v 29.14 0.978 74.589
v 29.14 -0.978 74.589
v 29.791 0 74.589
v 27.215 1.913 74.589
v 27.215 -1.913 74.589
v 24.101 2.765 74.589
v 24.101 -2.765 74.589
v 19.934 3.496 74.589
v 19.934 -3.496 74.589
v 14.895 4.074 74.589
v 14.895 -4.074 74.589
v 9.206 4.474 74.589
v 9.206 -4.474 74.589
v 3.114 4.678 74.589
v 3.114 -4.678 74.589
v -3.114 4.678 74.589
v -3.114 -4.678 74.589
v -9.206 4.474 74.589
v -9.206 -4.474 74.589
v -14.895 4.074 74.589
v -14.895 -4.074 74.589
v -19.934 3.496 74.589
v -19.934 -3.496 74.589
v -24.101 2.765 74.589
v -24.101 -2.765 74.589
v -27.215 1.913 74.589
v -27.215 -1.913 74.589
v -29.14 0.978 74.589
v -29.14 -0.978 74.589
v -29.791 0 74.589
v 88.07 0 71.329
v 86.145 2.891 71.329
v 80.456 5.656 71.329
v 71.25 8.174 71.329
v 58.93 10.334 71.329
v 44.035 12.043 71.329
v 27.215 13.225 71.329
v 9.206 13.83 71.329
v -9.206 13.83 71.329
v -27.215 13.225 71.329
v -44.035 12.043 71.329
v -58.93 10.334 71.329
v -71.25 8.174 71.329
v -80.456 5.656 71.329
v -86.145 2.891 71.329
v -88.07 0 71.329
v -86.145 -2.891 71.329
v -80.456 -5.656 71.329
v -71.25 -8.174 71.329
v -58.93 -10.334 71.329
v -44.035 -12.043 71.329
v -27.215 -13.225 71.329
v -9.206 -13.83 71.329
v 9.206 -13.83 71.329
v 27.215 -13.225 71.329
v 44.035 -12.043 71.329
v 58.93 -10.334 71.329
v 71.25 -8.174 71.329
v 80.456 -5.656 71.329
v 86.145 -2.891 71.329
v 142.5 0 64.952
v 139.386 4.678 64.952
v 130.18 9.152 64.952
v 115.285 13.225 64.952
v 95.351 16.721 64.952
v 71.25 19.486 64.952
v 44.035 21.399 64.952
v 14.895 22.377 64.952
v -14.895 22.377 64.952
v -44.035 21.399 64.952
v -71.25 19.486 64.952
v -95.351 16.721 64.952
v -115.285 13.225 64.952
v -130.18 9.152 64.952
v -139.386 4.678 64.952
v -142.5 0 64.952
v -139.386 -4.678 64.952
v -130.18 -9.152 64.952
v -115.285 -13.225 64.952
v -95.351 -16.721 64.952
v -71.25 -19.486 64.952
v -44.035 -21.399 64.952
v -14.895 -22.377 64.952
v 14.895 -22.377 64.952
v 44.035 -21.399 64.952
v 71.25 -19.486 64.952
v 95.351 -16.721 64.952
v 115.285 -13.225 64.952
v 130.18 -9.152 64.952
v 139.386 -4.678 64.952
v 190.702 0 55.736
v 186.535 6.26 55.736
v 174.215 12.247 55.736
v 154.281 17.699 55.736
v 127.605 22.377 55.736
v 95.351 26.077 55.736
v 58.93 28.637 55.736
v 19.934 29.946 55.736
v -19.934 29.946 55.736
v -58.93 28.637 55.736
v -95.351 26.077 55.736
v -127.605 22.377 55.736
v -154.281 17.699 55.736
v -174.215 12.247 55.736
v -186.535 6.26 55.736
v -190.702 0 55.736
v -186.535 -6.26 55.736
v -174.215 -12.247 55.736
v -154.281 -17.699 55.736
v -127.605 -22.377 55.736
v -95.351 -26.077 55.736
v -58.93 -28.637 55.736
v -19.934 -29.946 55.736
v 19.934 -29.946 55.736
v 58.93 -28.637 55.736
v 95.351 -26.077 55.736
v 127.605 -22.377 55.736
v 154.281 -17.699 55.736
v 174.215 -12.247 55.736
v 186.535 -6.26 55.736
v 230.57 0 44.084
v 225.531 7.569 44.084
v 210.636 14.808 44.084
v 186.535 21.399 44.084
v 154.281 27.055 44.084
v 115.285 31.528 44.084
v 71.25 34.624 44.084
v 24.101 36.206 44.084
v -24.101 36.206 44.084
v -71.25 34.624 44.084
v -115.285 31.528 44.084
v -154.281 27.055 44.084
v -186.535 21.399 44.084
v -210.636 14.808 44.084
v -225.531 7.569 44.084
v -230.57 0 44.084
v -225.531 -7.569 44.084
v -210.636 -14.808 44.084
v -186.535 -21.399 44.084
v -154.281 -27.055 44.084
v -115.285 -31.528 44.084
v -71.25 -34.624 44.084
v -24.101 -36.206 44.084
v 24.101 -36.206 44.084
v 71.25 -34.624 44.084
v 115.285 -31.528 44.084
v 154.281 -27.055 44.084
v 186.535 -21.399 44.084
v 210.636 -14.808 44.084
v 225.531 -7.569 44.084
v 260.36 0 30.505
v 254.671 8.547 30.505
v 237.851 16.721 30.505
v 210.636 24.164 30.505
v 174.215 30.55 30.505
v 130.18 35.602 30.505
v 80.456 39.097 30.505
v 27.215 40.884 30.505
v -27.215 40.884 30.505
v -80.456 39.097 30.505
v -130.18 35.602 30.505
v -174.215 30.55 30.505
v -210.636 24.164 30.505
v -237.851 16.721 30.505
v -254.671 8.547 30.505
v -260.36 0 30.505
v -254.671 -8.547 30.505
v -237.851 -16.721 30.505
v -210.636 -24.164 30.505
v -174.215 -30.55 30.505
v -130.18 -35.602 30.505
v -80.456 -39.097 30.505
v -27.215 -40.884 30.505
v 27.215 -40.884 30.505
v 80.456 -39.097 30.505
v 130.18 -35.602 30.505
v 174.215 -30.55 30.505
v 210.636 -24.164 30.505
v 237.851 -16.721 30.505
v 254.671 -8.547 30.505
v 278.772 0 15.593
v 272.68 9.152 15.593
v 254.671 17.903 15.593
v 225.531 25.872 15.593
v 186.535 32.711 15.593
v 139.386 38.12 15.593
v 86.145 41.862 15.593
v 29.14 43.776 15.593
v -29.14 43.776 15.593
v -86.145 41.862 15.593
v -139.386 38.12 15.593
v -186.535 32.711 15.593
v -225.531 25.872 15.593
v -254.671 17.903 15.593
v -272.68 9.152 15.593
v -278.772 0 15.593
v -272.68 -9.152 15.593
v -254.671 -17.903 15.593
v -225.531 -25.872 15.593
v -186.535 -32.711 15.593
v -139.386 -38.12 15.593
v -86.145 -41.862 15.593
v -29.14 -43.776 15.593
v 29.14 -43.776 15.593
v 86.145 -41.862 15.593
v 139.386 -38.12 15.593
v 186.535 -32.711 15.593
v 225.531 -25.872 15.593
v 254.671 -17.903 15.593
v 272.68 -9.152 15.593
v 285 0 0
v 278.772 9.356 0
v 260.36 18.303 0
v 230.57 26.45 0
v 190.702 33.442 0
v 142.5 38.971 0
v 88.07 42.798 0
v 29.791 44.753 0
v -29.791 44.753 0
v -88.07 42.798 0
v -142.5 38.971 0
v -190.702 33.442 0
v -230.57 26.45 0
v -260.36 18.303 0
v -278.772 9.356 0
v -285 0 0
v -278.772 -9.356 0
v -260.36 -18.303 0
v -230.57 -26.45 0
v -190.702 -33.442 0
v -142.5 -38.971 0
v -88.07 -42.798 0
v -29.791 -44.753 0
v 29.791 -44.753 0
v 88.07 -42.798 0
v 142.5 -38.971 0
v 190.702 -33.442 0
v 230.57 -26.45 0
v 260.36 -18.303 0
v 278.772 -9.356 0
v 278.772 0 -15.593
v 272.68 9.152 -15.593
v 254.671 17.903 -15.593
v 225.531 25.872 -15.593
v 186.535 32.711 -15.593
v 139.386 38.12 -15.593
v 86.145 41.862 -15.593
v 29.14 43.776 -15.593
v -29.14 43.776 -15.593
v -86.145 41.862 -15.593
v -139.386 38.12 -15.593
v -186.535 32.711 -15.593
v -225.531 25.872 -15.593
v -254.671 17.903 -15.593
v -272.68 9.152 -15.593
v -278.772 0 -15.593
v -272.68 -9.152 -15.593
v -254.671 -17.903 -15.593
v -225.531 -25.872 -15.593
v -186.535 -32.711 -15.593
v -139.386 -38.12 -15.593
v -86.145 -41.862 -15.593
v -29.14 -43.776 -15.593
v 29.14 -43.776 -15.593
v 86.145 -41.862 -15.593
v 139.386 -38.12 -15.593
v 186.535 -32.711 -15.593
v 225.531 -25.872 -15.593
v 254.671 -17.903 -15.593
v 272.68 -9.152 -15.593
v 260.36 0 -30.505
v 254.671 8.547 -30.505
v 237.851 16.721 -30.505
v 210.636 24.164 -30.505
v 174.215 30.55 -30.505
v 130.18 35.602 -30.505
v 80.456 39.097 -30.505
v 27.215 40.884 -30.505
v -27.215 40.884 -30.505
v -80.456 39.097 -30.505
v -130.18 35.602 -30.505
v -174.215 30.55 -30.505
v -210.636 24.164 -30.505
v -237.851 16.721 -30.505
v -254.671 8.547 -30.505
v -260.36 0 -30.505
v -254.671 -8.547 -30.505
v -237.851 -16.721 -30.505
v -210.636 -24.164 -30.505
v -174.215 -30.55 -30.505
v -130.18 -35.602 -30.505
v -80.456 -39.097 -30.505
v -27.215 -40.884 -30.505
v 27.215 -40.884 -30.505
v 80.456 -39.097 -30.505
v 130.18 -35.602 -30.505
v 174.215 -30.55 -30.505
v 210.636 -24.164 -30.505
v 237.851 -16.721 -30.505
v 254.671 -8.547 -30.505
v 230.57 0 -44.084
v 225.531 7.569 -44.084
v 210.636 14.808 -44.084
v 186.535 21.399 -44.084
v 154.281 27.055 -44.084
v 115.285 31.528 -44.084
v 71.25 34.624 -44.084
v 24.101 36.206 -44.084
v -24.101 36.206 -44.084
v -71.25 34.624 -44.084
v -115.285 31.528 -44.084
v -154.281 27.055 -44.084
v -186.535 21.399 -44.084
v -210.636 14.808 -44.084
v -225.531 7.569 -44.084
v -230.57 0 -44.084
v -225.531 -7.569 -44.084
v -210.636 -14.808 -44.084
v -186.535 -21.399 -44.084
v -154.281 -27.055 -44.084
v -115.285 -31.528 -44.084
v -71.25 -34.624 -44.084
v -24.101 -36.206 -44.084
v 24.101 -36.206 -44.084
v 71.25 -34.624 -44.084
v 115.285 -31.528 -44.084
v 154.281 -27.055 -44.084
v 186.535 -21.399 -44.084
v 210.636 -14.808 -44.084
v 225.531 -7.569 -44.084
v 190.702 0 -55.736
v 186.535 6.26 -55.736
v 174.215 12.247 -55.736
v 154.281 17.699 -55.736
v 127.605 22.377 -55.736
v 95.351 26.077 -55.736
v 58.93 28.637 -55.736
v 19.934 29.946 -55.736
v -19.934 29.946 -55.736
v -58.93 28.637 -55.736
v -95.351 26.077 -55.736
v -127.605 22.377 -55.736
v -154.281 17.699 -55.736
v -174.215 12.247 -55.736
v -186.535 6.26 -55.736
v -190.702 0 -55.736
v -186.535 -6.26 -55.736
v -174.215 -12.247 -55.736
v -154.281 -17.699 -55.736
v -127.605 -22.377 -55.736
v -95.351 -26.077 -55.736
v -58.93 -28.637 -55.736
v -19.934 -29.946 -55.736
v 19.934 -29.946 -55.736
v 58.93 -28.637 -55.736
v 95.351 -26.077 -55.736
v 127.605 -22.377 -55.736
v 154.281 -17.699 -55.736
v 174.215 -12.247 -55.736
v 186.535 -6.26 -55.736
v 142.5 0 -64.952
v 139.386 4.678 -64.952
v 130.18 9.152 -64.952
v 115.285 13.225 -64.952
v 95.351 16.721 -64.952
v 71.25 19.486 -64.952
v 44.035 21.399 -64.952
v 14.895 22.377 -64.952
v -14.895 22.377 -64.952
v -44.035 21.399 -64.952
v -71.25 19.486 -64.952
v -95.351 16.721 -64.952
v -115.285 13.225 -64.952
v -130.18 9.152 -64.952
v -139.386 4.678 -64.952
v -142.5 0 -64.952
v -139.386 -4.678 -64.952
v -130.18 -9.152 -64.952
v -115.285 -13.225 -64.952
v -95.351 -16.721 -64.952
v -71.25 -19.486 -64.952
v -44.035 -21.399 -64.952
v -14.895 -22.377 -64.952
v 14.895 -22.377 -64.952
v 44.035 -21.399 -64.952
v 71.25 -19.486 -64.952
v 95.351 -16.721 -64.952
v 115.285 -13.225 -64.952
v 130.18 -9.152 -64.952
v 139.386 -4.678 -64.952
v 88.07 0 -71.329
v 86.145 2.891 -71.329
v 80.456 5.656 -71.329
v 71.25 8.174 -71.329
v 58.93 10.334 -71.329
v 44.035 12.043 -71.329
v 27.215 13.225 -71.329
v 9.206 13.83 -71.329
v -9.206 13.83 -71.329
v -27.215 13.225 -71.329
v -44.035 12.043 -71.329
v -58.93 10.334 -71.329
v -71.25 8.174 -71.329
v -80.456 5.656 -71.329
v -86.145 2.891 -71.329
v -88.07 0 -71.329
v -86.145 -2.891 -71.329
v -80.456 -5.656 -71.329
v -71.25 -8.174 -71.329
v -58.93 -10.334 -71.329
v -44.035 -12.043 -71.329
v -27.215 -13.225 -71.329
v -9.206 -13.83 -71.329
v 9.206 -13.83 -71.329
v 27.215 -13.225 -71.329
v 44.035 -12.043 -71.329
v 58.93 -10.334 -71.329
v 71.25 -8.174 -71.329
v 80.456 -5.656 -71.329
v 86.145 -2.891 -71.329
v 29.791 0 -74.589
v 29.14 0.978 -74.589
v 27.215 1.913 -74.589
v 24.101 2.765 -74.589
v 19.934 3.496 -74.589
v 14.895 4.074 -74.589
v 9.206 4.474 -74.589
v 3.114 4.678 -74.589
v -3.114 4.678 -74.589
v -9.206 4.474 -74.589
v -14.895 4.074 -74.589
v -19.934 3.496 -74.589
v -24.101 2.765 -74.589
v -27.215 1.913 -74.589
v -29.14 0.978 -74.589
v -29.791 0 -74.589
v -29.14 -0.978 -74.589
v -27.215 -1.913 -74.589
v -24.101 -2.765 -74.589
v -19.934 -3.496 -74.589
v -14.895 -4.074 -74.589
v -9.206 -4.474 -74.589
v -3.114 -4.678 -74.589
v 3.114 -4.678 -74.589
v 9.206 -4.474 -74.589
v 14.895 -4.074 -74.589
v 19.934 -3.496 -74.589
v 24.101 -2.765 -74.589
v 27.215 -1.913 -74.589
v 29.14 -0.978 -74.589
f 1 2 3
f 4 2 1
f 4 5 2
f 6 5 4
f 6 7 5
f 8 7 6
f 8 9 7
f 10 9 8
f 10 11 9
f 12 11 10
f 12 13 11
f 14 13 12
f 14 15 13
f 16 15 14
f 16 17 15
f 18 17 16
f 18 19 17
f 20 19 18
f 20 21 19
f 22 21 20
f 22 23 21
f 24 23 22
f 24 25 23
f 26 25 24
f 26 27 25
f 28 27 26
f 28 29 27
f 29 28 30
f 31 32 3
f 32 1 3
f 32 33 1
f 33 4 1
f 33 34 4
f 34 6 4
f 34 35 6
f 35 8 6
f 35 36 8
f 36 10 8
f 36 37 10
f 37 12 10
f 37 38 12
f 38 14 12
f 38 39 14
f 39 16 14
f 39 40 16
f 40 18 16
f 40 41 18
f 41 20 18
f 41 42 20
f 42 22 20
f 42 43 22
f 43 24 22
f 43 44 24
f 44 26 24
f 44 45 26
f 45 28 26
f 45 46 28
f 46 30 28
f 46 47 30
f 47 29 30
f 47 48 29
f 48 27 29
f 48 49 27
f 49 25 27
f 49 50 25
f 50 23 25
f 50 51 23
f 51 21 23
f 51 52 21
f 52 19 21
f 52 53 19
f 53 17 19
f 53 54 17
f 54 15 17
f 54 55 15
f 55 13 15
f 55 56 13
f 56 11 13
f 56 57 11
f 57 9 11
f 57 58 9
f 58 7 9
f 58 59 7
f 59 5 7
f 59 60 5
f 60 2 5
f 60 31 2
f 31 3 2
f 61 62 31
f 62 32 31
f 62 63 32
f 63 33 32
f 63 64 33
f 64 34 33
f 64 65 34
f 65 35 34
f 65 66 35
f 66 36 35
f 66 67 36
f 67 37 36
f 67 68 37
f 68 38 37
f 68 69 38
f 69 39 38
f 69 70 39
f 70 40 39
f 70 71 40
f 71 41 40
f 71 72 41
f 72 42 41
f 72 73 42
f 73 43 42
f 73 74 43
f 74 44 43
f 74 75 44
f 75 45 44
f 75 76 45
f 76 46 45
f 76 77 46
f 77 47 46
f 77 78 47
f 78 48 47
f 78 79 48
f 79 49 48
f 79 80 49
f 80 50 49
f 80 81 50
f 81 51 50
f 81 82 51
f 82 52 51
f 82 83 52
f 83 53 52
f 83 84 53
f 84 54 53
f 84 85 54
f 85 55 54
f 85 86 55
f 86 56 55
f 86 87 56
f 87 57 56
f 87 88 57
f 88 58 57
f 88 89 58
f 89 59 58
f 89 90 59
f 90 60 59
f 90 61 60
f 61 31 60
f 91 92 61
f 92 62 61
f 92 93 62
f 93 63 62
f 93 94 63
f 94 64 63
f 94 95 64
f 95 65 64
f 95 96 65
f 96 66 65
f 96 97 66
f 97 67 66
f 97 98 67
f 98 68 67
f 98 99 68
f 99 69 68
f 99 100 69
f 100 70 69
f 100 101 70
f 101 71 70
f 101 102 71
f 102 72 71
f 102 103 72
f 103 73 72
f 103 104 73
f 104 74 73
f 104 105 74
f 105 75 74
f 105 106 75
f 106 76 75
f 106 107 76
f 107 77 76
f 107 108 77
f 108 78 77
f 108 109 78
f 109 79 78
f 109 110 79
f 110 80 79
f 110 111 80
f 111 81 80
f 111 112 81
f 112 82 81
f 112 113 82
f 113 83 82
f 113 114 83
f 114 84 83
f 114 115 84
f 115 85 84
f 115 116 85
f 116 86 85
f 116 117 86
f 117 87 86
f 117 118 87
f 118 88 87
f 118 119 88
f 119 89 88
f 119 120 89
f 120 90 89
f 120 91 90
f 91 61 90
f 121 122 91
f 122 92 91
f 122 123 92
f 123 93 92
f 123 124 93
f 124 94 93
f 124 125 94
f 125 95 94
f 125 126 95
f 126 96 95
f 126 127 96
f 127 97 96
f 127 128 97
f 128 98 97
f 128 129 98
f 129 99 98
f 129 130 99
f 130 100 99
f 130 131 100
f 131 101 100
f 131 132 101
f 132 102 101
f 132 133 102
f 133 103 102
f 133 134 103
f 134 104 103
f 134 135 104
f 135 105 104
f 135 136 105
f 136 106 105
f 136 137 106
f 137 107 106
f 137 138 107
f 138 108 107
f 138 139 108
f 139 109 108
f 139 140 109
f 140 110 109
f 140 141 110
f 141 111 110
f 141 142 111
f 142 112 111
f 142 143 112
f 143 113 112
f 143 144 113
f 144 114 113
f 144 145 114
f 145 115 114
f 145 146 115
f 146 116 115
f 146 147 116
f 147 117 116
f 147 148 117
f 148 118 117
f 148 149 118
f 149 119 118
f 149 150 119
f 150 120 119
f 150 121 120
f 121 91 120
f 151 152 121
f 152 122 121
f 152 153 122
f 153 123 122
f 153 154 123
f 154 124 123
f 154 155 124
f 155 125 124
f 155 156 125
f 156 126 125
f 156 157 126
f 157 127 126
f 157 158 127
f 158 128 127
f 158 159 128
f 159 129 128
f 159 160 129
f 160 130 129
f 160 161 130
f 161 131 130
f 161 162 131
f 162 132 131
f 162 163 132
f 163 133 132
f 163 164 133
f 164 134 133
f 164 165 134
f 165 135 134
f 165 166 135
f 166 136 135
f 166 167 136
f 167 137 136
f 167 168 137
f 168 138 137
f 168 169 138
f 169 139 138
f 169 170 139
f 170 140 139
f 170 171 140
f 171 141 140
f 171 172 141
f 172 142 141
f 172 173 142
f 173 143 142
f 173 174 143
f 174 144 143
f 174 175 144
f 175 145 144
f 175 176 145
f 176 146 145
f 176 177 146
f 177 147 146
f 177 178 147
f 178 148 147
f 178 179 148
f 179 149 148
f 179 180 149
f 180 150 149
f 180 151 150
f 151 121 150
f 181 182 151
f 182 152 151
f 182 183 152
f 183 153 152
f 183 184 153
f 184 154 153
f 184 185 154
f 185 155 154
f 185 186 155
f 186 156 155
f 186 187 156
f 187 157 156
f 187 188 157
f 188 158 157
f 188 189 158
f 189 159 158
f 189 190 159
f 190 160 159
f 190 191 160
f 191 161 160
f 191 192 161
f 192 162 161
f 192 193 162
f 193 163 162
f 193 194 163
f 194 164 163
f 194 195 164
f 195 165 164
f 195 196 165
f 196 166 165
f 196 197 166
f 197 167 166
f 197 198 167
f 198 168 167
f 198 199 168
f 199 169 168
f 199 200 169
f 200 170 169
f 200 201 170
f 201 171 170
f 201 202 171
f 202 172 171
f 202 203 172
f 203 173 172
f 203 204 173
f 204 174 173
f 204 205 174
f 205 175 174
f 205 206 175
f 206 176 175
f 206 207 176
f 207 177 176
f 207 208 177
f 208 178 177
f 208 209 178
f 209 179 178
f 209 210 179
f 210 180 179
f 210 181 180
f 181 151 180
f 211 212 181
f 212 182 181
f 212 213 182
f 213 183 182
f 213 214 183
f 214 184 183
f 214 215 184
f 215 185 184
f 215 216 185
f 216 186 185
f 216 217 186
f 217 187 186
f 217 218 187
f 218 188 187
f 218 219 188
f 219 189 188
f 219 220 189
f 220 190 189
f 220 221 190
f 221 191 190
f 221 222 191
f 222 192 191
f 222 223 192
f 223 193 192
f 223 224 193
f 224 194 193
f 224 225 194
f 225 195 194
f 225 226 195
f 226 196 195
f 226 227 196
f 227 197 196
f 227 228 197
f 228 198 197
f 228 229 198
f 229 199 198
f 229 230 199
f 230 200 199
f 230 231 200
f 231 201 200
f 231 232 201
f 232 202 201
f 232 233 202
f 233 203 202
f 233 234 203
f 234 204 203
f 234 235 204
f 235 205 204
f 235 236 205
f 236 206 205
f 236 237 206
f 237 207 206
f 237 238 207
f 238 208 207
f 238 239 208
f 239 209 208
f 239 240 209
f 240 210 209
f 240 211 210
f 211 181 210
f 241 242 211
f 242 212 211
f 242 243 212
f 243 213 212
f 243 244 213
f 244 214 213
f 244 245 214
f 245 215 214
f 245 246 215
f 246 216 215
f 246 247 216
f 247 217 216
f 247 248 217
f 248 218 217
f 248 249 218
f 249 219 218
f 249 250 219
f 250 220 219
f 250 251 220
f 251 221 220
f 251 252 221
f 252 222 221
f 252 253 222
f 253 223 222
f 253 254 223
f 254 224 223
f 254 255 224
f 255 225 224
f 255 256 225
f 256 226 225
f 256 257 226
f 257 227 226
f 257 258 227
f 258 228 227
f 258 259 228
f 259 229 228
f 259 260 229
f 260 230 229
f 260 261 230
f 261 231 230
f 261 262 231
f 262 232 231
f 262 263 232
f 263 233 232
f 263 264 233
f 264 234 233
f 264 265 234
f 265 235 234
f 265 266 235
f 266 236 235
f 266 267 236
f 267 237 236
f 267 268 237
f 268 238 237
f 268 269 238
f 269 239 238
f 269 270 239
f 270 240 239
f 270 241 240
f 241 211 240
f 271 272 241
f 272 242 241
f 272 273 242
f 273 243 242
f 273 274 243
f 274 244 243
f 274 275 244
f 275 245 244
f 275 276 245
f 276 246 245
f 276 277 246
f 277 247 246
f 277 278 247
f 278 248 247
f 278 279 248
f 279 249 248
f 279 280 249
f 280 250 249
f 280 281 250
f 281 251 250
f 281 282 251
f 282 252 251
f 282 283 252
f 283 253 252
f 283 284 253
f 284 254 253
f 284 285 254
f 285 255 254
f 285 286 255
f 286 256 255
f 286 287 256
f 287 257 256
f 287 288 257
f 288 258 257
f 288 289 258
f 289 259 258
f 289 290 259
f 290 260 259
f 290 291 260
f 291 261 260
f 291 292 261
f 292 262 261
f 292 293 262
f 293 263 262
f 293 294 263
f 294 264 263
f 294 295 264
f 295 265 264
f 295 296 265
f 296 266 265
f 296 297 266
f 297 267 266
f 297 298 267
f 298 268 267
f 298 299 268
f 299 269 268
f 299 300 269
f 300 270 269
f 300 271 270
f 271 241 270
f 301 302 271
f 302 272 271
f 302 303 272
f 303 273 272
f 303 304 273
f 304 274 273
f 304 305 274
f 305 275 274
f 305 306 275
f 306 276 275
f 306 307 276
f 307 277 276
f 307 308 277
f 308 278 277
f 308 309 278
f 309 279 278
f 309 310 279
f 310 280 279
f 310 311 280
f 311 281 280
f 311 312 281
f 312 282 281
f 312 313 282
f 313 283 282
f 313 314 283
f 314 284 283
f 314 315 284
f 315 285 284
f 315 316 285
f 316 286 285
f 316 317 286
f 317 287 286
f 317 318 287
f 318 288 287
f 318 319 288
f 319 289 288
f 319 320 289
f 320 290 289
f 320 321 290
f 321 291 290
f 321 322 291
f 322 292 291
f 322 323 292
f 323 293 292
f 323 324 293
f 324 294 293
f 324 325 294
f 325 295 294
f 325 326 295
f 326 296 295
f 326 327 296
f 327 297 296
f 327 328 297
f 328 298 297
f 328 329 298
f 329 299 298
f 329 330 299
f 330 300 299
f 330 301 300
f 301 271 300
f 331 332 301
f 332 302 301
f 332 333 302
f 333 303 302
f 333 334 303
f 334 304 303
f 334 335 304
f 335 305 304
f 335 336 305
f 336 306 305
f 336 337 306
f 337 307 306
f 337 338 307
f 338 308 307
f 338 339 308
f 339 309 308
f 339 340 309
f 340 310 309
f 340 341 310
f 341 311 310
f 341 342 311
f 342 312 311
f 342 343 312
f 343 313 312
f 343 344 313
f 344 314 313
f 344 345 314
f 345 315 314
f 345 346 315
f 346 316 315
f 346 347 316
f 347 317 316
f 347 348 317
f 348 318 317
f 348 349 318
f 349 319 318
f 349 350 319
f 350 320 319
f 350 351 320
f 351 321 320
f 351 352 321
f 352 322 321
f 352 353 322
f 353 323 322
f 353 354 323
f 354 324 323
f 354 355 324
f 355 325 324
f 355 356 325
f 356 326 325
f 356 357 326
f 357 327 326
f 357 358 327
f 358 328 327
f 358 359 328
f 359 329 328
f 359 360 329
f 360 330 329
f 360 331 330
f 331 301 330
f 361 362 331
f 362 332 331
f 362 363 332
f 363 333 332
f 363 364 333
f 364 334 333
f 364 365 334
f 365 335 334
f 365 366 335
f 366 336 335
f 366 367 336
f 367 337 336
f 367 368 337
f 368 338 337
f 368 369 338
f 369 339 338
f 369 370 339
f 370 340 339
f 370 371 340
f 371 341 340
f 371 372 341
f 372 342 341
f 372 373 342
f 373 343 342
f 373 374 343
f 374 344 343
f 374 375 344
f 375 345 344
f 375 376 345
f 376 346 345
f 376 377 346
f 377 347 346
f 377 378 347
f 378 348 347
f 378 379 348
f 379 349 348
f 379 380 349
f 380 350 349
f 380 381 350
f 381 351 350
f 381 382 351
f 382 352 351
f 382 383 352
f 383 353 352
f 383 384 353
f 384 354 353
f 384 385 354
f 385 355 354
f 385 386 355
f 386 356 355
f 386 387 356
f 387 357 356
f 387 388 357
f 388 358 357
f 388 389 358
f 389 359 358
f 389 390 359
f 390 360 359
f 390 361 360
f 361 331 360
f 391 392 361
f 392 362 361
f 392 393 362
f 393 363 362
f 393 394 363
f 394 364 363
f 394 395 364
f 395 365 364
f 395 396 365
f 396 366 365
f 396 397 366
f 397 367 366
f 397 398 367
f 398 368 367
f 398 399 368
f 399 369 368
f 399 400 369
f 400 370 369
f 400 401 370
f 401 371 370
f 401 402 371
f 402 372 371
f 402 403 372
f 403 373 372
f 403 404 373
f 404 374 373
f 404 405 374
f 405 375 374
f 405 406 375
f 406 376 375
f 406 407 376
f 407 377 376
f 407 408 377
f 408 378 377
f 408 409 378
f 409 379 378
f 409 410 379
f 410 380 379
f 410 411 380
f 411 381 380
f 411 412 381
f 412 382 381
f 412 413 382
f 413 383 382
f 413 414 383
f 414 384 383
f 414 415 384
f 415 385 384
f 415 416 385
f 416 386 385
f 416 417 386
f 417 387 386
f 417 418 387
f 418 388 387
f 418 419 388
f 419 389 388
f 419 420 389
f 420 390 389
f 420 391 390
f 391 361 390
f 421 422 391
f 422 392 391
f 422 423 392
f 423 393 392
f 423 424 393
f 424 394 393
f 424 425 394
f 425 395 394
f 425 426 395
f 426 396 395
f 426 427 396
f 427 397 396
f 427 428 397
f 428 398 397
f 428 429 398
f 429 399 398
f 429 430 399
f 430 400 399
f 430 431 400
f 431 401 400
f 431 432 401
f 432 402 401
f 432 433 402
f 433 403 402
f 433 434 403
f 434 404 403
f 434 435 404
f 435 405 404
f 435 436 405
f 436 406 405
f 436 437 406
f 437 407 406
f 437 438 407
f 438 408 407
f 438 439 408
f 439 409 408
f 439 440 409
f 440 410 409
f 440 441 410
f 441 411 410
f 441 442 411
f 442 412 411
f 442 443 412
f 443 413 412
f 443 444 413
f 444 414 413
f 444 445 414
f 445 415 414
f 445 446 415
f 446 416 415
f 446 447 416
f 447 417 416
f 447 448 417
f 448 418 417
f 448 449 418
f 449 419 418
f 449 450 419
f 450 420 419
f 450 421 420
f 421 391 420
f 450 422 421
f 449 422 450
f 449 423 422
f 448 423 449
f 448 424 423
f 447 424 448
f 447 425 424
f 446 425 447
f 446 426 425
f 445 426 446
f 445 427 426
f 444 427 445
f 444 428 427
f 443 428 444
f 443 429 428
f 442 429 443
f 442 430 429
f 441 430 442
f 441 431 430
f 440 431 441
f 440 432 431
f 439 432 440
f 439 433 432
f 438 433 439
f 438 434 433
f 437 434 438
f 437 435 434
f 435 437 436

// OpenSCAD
// Generated by SolidPython 1.0.1 on 2020-07-29 00:46:53


scale(v = [19, 3, 5]) {
	sphere(r = 15);
}
/***********************************************
*********      SolidPython code:      **********
************************************************
 
# import packages: SolidPython
from solid import *
from solid.utils import *
from itertools import chain, combinations, permutations


class Resize:

    def __init__(self, scad_file):
        self.scad_file = scad_file
        #self.scad_file = import_scad(scad_file)
        # cone/cylinder param:
        self.r1 = 0
        self.r2 = 0
        self.h = 0
        # rectangular prism param:
        self.w = 0
        self.l = 0
        # ellipse param:
        self.r = 0

    # import OpenScad code (file name corresponds to shape)


    # classify shape + parameters
    def assign(self, param1, param2, param3):
        if self.scad_file == 'cone.scad':
            self.r1 = param1
            self.r2 = param2
            self.h = param3
        elif self.scad_file == 'cylinder.scad':
            self.r1 = param1
            self.r2 = param2
            self.h = param3
        elif self.scad_file == 'rectangularPrism.scad':
            self.h = param1
            self.l = param2
            self.w = param3
        else:
            self.r = param1
            self.h = param2

    # resize parameters
    def iterate(self):
        x = range(3, 20, 2)
        i = 1
        if self.scad_file == 'cone.scad':
            tempList = list(permutations(x, 2))
            for temp in tempList:
                param1 = temp[0]
                param2 = temp[1]
                filepath = 'produced_scad_files/' + 'cone' + str(param1) + '_' + str(param2) + '_' + '.scad'
                scad_render_to_file(cylinder(h=param1, r1=param2, r2=0), filepath)

        elif self.scad_file == 'cylinder.scad':
            tempList = list(permutations(x, 3))
            for temp in tempList:
                param1 = temp[0]
                param2 = temp[1]
                filepath = 'produced_scad_files/' + 'cylinder' + str(param1) + '_' + str(param2) + '_' + '.scad'
                scad_render_to_file(cylinder(h=param1, r1=param2, r2=param2), filepath)

        elif self.scad_file == 'rectangularPrism.scad':
            tempList = list(permutations(x, 3))
            for temp in tempList:
                param1 = temp[0]
                param2 = temp[1]
                param3 = temp[2]
                filepath = 'produced_scad_files/' + 'rectangularPrism' + str(param1) + '_' + str(param2) + '_' + str(
                    param3) + '.scad'
                scad_render_to_file(cube(size=(param1, param2, param3)), filepath)

        elif self.scad_file == 'ellipse.scad':
            tempList = list(permutations(x, 4))
            for temp in tempList:
                param1 = temp[0]
                param2 = temp[1]
                param3 = temp[2]
                param4 = temp[3]
                filepath = 'produced_scad_files/' + 'ellipse' + str(param1) + '_' + str(param2) + '_' + str(param3) + '_' + str(param4) + '.scad'
                scad_render_to_file(scale([param1, param2, param3])(sphere(r=param4)), filepath)

    def render_to_scadfile(self):
        scad_render_to_file(scad, 'example.scad') 
 
************************************************/
